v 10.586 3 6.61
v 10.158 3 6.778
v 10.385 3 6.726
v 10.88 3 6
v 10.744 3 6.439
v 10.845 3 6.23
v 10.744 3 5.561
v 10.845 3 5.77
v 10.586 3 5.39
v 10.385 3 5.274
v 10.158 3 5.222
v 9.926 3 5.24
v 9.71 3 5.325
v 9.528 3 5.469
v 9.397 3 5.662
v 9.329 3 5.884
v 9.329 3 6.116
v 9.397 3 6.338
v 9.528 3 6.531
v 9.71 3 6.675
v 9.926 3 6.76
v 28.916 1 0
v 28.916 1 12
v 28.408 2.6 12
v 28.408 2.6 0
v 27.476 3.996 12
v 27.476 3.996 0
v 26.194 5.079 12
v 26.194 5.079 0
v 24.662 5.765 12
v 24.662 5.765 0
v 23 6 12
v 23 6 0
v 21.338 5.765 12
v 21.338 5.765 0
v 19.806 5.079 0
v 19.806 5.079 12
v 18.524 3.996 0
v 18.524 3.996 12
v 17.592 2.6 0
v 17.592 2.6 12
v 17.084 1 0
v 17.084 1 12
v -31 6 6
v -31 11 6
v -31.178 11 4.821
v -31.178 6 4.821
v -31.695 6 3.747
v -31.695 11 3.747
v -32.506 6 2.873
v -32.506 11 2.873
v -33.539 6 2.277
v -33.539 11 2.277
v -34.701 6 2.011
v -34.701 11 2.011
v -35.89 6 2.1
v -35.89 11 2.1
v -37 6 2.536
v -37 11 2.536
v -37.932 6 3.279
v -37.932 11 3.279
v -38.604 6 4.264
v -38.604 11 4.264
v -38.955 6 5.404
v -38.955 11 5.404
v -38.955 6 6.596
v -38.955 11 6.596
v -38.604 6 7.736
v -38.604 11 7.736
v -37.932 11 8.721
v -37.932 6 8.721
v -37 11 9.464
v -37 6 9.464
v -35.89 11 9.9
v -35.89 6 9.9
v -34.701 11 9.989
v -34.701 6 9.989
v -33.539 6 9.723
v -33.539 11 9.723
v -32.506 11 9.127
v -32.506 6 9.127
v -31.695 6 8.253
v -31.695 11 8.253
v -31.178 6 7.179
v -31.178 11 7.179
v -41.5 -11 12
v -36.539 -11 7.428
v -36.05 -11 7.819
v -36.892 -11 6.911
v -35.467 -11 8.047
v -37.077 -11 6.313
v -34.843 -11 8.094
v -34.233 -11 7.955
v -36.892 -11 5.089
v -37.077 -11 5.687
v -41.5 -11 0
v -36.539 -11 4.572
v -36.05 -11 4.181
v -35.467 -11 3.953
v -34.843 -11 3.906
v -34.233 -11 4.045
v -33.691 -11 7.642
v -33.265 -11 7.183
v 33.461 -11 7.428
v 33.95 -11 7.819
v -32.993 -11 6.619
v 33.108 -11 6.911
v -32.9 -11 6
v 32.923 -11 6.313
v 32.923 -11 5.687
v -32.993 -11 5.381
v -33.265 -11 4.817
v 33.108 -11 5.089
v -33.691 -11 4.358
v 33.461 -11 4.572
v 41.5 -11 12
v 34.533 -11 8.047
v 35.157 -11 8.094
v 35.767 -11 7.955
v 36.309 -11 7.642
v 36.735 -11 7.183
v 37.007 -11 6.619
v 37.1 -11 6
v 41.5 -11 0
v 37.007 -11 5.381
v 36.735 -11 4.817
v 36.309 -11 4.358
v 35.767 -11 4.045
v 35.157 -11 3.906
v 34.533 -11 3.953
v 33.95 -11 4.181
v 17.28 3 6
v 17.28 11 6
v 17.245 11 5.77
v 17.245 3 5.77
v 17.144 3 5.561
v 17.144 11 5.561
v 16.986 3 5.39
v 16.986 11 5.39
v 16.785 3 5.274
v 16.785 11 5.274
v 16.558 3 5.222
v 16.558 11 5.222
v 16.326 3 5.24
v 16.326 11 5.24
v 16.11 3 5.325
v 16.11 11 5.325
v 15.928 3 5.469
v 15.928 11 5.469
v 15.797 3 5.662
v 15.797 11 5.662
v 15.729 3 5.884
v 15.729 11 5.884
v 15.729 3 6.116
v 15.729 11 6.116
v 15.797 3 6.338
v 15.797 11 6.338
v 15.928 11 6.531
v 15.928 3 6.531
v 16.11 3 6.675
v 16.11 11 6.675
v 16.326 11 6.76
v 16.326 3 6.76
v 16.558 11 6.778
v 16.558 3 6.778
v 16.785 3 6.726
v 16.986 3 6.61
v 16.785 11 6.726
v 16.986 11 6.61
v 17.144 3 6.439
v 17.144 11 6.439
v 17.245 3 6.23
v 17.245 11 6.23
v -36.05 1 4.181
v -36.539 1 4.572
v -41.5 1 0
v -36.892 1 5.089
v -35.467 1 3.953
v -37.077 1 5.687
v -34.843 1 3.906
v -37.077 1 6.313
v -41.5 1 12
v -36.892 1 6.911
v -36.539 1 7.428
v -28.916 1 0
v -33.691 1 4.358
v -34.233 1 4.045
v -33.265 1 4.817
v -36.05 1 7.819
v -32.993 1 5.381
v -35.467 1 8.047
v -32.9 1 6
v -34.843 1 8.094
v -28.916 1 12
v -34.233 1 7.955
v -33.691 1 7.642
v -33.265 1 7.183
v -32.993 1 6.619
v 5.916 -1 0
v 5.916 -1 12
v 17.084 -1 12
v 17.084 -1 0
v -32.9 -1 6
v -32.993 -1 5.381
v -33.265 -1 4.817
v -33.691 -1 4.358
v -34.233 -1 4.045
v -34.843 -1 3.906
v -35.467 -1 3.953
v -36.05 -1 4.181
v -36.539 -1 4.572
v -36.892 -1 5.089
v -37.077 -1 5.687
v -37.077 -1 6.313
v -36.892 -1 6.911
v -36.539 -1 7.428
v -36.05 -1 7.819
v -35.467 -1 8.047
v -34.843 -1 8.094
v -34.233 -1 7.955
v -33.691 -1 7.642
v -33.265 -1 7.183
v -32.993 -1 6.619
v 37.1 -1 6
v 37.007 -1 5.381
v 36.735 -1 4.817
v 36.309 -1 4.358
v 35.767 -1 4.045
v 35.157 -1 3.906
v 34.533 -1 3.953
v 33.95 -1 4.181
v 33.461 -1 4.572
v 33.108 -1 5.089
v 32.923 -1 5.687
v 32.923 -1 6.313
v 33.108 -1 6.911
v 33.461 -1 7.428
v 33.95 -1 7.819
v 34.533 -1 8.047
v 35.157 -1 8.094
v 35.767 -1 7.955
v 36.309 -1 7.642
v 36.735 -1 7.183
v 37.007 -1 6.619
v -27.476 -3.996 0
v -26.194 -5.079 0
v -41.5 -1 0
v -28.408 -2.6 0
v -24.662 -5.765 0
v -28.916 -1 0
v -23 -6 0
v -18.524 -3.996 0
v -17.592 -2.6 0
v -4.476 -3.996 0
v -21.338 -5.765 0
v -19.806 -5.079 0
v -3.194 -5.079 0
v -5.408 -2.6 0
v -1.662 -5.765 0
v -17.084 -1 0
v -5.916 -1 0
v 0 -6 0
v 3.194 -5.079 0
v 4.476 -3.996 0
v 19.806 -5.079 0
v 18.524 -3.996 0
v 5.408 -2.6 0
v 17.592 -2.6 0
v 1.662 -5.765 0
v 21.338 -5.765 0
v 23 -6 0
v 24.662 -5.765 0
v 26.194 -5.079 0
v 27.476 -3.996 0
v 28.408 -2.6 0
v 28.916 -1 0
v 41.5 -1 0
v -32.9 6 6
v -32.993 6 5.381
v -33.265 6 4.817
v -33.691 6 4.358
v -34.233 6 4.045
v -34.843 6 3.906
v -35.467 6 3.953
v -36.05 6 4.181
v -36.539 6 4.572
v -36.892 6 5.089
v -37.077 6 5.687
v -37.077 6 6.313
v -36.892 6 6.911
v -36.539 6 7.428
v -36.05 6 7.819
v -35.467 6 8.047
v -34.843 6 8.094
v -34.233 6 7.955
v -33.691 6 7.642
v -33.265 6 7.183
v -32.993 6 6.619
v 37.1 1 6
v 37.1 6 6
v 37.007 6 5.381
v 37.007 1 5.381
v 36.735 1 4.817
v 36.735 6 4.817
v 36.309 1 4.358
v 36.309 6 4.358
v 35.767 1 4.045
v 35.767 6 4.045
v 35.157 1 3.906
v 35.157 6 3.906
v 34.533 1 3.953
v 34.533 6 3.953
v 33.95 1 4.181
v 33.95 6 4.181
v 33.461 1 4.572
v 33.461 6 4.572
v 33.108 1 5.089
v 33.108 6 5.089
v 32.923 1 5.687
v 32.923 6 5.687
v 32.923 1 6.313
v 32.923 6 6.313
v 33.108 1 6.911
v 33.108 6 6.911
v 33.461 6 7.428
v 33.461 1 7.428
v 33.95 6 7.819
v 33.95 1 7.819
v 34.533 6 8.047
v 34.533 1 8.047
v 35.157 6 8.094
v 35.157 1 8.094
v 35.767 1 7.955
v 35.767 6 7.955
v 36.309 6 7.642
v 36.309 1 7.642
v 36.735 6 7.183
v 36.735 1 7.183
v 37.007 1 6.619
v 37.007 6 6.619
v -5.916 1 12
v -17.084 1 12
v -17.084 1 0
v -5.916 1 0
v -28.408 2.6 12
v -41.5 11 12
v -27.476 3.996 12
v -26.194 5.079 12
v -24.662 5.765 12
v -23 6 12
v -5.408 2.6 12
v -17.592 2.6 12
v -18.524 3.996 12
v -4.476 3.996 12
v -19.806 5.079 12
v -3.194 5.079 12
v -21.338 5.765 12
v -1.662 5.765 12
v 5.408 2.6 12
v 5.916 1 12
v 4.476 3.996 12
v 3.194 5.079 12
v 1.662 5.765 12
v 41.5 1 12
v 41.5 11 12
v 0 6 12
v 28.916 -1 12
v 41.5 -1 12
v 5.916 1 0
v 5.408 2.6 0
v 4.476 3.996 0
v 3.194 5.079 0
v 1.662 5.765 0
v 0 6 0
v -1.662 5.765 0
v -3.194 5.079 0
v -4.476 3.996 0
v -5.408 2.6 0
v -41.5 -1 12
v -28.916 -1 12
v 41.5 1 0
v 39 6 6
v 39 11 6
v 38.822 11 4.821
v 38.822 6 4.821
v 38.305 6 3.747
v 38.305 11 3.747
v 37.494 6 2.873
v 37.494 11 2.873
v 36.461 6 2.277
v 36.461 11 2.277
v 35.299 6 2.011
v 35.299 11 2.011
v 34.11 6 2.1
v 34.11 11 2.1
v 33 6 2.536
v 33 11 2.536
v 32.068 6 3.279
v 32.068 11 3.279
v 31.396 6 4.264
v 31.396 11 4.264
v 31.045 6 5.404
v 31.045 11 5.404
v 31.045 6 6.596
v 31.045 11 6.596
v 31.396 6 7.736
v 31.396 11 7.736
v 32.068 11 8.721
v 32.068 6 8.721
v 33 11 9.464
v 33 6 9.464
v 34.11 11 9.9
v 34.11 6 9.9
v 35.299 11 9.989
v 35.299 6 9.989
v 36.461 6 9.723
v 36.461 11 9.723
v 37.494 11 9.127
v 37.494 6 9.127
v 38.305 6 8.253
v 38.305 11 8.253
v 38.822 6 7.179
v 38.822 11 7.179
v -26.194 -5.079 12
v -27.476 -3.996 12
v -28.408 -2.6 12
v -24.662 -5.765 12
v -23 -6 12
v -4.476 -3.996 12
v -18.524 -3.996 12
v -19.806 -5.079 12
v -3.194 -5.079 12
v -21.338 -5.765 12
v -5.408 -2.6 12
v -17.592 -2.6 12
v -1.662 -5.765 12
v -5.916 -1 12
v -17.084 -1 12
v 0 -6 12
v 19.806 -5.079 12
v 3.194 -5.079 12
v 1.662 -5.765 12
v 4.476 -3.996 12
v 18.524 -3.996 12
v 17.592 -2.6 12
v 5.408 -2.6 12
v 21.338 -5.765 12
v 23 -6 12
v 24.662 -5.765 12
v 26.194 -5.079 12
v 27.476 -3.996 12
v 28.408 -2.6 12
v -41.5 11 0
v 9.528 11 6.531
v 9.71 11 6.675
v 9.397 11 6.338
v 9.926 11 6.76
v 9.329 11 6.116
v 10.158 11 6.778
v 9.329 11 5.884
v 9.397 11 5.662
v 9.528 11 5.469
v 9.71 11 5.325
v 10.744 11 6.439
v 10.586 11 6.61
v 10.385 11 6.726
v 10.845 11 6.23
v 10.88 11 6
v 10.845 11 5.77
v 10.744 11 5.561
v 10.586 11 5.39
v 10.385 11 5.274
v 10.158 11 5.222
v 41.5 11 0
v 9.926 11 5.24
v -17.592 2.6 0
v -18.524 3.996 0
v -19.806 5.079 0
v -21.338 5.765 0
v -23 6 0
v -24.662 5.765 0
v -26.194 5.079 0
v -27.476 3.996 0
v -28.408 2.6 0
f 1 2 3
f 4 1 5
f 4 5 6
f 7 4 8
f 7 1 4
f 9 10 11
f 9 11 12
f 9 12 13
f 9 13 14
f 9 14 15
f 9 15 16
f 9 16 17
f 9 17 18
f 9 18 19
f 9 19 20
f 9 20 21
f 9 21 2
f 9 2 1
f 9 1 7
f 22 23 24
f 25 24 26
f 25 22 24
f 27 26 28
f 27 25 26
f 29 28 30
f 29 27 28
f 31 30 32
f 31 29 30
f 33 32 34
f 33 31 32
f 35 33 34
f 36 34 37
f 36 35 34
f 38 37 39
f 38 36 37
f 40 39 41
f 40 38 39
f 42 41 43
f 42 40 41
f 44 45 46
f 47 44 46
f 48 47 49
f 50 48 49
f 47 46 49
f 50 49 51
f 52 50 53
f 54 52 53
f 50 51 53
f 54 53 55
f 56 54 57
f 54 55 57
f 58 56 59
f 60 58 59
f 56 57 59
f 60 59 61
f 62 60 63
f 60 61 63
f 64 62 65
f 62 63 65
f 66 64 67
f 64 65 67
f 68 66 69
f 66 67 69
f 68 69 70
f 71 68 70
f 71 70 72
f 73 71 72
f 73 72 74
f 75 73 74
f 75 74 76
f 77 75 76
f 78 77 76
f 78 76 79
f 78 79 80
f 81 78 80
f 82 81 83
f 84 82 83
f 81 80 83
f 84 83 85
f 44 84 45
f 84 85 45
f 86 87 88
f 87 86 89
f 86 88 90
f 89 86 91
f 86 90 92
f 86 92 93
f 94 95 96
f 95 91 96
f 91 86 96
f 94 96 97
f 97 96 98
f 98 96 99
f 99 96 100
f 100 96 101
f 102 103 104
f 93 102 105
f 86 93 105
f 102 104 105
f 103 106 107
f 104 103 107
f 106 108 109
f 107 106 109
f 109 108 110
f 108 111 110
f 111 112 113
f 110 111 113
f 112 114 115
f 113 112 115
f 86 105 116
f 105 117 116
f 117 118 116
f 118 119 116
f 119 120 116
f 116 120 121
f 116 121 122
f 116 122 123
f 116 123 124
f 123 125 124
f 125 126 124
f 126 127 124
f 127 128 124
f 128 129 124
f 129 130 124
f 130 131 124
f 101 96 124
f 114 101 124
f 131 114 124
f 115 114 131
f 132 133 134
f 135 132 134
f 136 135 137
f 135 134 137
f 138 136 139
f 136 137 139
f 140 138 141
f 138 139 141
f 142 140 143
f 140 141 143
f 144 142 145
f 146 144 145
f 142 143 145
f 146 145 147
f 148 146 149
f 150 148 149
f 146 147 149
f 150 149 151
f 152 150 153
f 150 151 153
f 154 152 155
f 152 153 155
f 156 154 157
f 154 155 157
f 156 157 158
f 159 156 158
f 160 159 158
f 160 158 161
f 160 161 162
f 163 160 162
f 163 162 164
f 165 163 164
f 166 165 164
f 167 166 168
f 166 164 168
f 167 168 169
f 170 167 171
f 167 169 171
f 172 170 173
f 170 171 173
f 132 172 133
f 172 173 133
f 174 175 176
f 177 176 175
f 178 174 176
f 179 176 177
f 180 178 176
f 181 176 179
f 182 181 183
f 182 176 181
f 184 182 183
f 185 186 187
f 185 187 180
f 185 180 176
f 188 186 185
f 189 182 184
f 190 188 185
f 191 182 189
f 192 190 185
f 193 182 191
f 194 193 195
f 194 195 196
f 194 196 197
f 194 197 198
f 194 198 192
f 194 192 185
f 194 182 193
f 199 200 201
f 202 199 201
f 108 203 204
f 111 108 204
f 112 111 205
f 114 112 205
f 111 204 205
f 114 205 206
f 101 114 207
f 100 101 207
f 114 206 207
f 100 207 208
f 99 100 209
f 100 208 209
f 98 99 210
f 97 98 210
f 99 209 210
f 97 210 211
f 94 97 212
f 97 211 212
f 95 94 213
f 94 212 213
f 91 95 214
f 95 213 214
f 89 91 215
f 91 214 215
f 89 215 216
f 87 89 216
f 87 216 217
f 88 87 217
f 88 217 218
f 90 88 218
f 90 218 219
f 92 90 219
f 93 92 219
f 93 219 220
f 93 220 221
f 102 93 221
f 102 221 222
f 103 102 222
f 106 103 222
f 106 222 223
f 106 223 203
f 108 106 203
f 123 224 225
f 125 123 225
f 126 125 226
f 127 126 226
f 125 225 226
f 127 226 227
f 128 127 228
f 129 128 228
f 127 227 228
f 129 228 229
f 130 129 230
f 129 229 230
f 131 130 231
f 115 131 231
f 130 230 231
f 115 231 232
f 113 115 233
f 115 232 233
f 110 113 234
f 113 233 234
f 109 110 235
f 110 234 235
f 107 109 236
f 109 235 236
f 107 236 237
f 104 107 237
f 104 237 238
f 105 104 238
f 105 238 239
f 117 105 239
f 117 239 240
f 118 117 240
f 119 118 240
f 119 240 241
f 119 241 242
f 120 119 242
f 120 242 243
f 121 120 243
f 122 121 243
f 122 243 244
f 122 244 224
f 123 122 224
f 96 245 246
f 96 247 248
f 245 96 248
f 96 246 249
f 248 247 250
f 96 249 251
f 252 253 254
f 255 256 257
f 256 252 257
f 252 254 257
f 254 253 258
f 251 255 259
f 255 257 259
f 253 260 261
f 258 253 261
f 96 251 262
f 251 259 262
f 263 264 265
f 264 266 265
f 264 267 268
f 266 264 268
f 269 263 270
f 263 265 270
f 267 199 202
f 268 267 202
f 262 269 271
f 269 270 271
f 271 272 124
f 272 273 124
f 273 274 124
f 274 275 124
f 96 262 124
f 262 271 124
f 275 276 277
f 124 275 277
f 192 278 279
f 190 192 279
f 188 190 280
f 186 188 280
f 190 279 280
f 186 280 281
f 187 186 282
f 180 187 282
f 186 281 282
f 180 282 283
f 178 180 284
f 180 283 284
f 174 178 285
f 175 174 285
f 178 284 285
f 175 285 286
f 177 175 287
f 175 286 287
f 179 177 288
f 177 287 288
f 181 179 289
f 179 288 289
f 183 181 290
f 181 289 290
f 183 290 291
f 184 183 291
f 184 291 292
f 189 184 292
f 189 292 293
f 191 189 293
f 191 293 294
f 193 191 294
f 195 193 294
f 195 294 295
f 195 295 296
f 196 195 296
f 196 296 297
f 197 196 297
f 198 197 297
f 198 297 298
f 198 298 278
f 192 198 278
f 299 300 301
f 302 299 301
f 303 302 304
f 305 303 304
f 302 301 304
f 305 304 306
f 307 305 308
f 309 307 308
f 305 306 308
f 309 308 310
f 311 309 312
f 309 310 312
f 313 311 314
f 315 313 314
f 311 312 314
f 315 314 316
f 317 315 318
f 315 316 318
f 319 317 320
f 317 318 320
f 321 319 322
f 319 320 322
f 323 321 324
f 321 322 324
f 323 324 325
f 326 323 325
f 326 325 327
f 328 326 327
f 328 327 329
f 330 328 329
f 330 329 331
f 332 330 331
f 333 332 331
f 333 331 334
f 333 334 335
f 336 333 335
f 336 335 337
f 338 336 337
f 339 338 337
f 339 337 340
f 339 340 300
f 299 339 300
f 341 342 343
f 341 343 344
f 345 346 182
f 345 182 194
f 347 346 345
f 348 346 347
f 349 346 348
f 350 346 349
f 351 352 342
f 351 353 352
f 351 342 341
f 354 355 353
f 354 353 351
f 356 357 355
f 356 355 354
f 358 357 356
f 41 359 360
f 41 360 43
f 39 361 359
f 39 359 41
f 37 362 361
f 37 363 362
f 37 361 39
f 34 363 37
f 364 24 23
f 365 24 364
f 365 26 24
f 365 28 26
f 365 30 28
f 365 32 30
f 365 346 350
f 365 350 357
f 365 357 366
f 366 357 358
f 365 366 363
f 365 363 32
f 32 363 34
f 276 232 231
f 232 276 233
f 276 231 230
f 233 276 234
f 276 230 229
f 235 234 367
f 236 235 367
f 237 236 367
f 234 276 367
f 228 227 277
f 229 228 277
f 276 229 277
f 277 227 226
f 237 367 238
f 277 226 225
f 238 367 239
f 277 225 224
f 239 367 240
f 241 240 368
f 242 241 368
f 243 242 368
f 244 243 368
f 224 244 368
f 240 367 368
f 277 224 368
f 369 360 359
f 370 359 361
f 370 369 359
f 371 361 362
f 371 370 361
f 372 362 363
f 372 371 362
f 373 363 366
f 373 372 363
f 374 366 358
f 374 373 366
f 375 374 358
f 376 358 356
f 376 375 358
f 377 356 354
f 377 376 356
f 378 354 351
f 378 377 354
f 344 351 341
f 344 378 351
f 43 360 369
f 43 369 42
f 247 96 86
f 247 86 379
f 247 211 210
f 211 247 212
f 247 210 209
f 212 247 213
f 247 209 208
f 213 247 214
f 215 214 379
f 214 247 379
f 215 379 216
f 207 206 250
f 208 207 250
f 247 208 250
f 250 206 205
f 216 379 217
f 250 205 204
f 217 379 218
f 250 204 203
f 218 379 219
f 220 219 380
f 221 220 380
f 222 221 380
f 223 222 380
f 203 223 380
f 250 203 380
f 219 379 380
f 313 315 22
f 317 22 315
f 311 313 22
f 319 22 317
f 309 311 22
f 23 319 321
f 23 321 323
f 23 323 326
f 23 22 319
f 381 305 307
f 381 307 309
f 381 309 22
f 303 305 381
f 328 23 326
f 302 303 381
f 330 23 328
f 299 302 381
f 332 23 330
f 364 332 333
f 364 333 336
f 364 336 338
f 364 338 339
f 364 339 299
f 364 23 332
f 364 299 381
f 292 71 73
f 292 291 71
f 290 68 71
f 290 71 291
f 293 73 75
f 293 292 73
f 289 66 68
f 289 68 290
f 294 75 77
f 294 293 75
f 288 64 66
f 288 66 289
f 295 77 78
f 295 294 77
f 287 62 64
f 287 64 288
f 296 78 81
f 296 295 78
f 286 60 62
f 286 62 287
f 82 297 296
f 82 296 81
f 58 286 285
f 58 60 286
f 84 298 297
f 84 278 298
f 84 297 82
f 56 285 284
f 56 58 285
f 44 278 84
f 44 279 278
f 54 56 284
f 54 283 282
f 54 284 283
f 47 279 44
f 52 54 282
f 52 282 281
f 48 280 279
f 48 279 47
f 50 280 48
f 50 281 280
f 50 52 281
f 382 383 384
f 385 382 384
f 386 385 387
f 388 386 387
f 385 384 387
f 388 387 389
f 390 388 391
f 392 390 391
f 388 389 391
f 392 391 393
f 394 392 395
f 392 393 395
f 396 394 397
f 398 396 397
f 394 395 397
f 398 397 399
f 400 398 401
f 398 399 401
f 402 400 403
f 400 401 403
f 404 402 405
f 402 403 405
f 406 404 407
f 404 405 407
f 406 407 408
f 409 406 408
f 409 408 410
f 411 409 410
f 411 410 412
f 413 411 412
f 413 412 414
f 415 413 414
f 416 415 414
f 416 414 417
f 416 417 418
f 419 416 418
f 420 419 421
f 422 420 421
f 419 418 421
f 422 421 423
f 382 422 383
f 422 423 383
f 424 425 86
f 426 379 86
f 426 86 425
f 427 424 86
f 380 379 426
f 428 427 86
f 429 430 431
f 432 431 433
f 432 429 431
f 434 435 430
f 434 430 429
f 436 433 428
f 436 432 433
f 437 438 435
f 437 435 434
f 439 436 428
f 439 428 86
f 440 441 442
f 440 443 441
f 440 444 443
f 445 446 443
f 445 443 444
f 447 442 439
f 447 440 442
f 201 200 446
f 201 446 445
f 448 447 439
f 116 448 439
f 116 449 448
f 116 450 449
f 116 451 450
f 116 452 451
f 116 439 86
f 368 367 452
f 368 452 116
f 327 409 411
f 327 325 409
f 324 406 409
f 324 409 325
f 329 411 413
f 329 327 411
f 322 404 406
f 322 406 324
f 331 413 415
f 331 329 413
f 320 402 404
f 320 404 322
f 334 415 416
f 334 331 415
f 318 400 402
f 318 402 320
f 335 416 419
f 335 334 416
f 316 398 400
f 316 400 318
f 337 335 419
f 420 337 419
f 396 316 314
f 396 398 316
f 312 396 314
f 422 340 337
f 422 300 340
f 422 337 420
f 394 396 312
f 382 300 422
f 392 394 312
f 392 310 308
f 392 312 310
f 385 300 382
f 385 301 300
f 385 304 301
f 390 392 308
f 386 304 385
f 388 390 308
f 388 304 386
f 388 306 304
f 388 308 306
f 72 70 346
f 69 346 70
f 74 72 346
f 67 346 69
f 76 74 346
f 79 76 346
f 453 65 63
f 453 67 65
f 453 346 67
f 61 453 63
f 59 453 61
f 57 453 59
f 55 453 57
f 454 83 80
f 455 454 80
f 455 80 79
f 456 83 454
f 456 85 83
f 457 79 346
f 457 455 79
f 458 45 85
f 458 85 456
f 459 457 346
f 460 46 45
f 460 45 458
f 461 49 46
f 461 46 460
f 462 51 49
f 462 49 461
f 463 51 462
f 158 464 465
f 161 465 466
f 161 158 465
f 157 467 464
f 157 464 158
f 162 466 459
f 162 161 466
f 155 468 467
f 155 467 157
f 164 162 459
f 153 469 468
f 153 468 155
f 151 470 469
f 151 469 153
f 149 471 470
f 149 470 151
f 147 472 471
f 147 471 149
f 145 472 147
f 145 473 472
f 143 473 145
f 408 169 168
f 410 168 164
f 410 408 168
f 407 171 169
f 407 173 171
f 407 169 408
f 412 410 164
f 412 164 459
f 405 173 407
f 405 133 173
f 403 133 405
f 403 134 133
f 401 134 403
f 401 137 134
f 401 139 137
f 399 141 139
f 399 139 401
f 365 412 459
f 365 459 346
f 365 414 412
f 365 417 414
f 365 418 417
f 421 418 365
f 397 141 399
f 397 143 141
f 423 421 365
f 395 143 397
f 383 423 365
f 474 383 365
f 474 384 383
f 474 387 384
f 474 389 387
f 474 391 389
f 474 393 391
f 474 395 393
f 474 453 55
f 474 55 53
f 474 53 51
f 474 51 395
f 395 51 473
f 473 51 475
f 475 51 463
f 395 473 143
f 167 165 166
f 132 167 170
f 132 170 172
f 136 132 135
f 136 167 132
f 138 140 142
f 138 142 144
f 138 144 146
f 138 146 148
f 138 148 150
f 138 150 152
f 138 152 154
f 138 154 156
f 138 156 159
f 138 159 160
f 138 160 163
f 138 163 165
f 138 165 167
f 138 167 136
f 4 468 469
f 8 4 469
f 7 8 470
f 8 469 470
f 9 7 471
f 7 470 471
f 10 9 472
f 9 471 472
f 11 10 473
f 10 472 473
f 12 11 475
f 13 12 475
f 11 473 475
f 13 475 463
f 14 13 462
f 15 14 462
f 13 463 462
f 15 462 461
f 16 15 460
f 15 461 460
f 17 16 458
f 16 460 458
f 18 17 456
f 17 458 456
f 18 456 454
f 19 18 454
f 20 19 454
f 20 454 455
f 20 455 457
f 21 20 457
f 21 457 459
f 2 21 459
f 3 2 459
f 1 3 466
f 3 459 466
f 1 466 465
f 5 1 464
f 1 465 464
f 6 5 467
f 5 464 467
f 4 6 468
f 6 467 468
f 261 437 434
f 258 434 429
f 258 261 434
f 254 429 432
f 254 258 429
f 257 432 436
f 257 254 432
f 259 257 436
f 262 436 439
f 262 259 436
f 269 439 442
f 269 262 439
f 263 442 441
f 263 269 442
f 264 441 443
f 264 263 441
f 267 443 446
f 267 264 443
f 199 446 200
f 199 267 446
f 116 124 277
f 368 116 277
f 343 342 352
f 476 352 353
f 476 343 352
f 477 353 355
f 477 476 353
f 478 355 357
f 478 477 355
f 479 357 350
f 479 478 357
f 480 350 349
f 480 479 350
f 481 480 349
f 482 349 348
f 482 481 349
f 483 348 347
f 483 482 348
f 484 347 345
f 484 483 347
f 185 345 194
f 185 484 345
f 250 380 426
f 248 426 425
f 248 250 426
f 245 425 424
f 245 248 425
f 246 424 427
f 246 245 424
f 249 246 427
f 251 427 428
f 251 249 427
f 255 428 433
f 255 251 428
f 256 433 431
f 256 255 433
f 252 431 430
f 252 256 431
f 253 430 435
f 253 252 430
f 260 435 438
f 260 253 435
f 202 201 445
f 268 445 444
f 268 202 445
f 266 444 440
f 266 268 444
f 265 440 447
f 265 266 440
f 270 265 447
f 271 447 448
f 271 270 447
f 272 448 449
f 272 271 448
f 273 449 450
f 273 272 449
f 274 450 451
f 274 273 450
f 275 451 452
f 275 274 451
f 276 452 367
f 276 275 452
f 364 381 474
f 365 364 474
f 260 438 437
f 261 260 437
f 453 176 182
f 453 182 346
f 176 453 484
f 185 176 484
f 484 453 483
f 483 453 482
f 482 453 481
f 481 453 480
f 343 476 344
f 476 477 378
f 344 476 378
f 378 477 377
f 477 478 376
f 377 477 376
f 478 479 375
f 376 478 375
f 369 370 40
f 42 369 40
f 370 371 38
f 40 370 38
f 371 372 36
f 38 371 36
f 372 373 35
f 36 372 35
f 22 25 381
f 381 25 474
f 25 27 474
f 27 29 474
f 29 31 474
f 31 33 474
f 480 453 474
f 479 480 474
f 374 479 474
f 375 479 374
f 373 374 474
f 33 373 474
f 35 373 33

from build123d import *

# Parameters (mm, degrees)
SKETCH1_W           = 83
SKETCH1_H           = 22
SKETCH1_R           = 6
BOSS_EXTRUDE1_DEPTH = 12
SKETCH2_R           = 2.1
CUT_EXTRUDE1_DEPTH  = 23
SKETCH3_R           = 4
CUT_EXTRUDE2_DEPTH  = 5
SKETCH4_W           = 96.23839679
SKETCH4_H           = 2
CUT_EXTRUDE3_DEPTH  = 13
SKETCH5_R           = 0.78
CUT_EXTRUDE4_DEPTH  = 8


with BuildPart() as part:
    # Sketch1 → Boss-Extrude1 (new body)
    with BuildSketch(Plane.XY):
        Rectangle(SKETCH1_W, SKETCH1_H)
        Circle(SKETCH1_R, mode=Mode.SUBTRACT)
        with Locations((-23, 0)):
            Circle(SKETCH1_R, mode=Mode.SUBTRACT)
        with Locations((23, 0)):
            Circle(SKETCH1_R, mode=Mode.SUBTRACT)
    extrude(amount=BOSS_EXTRUDE1_DEPTH)

    # Sketch2 → Cut-Extrude1 (cut, through all)
    with BuildSketch(Plane(origin=(0, 11, 0), x_dir=(1, 0, 0), z_dir=(0, 1, 0))):
        with Locations((-35, -6)):
            Circle(SKETCH2_R)
        with Locations((35, -6)):
            Circle(SKETCH2_R)
    extrude(amount=-CUT_EXTRUDE1_DEPTH, mode=Mode.SUBTRACT)

    # Sketch3 → Cut-Extrude2 (cut)
    with BuildSketch(Plane(origin=(0, 11, 0), x_dir=(1, 0, 0), z_dir=(0, 1, 0))):
        with Locations((-35, -6)):
            Circle(SKETCH3_R)
        with Locations((35, -6)):
            Circle(SKETCH3_R)
    extrude(amount=-CUT_EXTRUDE2_DEPTH, mode=Mode.SUBTRACT)

    # Sketch4 → Cut-Extrude3 (cut, through all)
    with BuildSketch(Plane.XY.offset(12)):
        Rectangle(SKETCH4_W, SKETCH4_H)
    extrude(amount=-CUT_EXTRUDE3_DEPTH, mode=Mode.SUBTRACT)

    # Sketch5 → Cut-Extrude4 (cut)
    with BuildSketch(Plane(origin=(0, 11, 0), x_dir=(1, 0, 0), z_dir=(0, 1, 0))):
        with Locations((16.5, -6)):
            Circle(SKETCH5_R)
        with Locations((10.1, -6)):
            Circle(SKETCH5_R)
    extrude(amount=-CUT_EXTRUDE4_DEPTH, mode=Mode.SUBTRACT)


solid = part.part
